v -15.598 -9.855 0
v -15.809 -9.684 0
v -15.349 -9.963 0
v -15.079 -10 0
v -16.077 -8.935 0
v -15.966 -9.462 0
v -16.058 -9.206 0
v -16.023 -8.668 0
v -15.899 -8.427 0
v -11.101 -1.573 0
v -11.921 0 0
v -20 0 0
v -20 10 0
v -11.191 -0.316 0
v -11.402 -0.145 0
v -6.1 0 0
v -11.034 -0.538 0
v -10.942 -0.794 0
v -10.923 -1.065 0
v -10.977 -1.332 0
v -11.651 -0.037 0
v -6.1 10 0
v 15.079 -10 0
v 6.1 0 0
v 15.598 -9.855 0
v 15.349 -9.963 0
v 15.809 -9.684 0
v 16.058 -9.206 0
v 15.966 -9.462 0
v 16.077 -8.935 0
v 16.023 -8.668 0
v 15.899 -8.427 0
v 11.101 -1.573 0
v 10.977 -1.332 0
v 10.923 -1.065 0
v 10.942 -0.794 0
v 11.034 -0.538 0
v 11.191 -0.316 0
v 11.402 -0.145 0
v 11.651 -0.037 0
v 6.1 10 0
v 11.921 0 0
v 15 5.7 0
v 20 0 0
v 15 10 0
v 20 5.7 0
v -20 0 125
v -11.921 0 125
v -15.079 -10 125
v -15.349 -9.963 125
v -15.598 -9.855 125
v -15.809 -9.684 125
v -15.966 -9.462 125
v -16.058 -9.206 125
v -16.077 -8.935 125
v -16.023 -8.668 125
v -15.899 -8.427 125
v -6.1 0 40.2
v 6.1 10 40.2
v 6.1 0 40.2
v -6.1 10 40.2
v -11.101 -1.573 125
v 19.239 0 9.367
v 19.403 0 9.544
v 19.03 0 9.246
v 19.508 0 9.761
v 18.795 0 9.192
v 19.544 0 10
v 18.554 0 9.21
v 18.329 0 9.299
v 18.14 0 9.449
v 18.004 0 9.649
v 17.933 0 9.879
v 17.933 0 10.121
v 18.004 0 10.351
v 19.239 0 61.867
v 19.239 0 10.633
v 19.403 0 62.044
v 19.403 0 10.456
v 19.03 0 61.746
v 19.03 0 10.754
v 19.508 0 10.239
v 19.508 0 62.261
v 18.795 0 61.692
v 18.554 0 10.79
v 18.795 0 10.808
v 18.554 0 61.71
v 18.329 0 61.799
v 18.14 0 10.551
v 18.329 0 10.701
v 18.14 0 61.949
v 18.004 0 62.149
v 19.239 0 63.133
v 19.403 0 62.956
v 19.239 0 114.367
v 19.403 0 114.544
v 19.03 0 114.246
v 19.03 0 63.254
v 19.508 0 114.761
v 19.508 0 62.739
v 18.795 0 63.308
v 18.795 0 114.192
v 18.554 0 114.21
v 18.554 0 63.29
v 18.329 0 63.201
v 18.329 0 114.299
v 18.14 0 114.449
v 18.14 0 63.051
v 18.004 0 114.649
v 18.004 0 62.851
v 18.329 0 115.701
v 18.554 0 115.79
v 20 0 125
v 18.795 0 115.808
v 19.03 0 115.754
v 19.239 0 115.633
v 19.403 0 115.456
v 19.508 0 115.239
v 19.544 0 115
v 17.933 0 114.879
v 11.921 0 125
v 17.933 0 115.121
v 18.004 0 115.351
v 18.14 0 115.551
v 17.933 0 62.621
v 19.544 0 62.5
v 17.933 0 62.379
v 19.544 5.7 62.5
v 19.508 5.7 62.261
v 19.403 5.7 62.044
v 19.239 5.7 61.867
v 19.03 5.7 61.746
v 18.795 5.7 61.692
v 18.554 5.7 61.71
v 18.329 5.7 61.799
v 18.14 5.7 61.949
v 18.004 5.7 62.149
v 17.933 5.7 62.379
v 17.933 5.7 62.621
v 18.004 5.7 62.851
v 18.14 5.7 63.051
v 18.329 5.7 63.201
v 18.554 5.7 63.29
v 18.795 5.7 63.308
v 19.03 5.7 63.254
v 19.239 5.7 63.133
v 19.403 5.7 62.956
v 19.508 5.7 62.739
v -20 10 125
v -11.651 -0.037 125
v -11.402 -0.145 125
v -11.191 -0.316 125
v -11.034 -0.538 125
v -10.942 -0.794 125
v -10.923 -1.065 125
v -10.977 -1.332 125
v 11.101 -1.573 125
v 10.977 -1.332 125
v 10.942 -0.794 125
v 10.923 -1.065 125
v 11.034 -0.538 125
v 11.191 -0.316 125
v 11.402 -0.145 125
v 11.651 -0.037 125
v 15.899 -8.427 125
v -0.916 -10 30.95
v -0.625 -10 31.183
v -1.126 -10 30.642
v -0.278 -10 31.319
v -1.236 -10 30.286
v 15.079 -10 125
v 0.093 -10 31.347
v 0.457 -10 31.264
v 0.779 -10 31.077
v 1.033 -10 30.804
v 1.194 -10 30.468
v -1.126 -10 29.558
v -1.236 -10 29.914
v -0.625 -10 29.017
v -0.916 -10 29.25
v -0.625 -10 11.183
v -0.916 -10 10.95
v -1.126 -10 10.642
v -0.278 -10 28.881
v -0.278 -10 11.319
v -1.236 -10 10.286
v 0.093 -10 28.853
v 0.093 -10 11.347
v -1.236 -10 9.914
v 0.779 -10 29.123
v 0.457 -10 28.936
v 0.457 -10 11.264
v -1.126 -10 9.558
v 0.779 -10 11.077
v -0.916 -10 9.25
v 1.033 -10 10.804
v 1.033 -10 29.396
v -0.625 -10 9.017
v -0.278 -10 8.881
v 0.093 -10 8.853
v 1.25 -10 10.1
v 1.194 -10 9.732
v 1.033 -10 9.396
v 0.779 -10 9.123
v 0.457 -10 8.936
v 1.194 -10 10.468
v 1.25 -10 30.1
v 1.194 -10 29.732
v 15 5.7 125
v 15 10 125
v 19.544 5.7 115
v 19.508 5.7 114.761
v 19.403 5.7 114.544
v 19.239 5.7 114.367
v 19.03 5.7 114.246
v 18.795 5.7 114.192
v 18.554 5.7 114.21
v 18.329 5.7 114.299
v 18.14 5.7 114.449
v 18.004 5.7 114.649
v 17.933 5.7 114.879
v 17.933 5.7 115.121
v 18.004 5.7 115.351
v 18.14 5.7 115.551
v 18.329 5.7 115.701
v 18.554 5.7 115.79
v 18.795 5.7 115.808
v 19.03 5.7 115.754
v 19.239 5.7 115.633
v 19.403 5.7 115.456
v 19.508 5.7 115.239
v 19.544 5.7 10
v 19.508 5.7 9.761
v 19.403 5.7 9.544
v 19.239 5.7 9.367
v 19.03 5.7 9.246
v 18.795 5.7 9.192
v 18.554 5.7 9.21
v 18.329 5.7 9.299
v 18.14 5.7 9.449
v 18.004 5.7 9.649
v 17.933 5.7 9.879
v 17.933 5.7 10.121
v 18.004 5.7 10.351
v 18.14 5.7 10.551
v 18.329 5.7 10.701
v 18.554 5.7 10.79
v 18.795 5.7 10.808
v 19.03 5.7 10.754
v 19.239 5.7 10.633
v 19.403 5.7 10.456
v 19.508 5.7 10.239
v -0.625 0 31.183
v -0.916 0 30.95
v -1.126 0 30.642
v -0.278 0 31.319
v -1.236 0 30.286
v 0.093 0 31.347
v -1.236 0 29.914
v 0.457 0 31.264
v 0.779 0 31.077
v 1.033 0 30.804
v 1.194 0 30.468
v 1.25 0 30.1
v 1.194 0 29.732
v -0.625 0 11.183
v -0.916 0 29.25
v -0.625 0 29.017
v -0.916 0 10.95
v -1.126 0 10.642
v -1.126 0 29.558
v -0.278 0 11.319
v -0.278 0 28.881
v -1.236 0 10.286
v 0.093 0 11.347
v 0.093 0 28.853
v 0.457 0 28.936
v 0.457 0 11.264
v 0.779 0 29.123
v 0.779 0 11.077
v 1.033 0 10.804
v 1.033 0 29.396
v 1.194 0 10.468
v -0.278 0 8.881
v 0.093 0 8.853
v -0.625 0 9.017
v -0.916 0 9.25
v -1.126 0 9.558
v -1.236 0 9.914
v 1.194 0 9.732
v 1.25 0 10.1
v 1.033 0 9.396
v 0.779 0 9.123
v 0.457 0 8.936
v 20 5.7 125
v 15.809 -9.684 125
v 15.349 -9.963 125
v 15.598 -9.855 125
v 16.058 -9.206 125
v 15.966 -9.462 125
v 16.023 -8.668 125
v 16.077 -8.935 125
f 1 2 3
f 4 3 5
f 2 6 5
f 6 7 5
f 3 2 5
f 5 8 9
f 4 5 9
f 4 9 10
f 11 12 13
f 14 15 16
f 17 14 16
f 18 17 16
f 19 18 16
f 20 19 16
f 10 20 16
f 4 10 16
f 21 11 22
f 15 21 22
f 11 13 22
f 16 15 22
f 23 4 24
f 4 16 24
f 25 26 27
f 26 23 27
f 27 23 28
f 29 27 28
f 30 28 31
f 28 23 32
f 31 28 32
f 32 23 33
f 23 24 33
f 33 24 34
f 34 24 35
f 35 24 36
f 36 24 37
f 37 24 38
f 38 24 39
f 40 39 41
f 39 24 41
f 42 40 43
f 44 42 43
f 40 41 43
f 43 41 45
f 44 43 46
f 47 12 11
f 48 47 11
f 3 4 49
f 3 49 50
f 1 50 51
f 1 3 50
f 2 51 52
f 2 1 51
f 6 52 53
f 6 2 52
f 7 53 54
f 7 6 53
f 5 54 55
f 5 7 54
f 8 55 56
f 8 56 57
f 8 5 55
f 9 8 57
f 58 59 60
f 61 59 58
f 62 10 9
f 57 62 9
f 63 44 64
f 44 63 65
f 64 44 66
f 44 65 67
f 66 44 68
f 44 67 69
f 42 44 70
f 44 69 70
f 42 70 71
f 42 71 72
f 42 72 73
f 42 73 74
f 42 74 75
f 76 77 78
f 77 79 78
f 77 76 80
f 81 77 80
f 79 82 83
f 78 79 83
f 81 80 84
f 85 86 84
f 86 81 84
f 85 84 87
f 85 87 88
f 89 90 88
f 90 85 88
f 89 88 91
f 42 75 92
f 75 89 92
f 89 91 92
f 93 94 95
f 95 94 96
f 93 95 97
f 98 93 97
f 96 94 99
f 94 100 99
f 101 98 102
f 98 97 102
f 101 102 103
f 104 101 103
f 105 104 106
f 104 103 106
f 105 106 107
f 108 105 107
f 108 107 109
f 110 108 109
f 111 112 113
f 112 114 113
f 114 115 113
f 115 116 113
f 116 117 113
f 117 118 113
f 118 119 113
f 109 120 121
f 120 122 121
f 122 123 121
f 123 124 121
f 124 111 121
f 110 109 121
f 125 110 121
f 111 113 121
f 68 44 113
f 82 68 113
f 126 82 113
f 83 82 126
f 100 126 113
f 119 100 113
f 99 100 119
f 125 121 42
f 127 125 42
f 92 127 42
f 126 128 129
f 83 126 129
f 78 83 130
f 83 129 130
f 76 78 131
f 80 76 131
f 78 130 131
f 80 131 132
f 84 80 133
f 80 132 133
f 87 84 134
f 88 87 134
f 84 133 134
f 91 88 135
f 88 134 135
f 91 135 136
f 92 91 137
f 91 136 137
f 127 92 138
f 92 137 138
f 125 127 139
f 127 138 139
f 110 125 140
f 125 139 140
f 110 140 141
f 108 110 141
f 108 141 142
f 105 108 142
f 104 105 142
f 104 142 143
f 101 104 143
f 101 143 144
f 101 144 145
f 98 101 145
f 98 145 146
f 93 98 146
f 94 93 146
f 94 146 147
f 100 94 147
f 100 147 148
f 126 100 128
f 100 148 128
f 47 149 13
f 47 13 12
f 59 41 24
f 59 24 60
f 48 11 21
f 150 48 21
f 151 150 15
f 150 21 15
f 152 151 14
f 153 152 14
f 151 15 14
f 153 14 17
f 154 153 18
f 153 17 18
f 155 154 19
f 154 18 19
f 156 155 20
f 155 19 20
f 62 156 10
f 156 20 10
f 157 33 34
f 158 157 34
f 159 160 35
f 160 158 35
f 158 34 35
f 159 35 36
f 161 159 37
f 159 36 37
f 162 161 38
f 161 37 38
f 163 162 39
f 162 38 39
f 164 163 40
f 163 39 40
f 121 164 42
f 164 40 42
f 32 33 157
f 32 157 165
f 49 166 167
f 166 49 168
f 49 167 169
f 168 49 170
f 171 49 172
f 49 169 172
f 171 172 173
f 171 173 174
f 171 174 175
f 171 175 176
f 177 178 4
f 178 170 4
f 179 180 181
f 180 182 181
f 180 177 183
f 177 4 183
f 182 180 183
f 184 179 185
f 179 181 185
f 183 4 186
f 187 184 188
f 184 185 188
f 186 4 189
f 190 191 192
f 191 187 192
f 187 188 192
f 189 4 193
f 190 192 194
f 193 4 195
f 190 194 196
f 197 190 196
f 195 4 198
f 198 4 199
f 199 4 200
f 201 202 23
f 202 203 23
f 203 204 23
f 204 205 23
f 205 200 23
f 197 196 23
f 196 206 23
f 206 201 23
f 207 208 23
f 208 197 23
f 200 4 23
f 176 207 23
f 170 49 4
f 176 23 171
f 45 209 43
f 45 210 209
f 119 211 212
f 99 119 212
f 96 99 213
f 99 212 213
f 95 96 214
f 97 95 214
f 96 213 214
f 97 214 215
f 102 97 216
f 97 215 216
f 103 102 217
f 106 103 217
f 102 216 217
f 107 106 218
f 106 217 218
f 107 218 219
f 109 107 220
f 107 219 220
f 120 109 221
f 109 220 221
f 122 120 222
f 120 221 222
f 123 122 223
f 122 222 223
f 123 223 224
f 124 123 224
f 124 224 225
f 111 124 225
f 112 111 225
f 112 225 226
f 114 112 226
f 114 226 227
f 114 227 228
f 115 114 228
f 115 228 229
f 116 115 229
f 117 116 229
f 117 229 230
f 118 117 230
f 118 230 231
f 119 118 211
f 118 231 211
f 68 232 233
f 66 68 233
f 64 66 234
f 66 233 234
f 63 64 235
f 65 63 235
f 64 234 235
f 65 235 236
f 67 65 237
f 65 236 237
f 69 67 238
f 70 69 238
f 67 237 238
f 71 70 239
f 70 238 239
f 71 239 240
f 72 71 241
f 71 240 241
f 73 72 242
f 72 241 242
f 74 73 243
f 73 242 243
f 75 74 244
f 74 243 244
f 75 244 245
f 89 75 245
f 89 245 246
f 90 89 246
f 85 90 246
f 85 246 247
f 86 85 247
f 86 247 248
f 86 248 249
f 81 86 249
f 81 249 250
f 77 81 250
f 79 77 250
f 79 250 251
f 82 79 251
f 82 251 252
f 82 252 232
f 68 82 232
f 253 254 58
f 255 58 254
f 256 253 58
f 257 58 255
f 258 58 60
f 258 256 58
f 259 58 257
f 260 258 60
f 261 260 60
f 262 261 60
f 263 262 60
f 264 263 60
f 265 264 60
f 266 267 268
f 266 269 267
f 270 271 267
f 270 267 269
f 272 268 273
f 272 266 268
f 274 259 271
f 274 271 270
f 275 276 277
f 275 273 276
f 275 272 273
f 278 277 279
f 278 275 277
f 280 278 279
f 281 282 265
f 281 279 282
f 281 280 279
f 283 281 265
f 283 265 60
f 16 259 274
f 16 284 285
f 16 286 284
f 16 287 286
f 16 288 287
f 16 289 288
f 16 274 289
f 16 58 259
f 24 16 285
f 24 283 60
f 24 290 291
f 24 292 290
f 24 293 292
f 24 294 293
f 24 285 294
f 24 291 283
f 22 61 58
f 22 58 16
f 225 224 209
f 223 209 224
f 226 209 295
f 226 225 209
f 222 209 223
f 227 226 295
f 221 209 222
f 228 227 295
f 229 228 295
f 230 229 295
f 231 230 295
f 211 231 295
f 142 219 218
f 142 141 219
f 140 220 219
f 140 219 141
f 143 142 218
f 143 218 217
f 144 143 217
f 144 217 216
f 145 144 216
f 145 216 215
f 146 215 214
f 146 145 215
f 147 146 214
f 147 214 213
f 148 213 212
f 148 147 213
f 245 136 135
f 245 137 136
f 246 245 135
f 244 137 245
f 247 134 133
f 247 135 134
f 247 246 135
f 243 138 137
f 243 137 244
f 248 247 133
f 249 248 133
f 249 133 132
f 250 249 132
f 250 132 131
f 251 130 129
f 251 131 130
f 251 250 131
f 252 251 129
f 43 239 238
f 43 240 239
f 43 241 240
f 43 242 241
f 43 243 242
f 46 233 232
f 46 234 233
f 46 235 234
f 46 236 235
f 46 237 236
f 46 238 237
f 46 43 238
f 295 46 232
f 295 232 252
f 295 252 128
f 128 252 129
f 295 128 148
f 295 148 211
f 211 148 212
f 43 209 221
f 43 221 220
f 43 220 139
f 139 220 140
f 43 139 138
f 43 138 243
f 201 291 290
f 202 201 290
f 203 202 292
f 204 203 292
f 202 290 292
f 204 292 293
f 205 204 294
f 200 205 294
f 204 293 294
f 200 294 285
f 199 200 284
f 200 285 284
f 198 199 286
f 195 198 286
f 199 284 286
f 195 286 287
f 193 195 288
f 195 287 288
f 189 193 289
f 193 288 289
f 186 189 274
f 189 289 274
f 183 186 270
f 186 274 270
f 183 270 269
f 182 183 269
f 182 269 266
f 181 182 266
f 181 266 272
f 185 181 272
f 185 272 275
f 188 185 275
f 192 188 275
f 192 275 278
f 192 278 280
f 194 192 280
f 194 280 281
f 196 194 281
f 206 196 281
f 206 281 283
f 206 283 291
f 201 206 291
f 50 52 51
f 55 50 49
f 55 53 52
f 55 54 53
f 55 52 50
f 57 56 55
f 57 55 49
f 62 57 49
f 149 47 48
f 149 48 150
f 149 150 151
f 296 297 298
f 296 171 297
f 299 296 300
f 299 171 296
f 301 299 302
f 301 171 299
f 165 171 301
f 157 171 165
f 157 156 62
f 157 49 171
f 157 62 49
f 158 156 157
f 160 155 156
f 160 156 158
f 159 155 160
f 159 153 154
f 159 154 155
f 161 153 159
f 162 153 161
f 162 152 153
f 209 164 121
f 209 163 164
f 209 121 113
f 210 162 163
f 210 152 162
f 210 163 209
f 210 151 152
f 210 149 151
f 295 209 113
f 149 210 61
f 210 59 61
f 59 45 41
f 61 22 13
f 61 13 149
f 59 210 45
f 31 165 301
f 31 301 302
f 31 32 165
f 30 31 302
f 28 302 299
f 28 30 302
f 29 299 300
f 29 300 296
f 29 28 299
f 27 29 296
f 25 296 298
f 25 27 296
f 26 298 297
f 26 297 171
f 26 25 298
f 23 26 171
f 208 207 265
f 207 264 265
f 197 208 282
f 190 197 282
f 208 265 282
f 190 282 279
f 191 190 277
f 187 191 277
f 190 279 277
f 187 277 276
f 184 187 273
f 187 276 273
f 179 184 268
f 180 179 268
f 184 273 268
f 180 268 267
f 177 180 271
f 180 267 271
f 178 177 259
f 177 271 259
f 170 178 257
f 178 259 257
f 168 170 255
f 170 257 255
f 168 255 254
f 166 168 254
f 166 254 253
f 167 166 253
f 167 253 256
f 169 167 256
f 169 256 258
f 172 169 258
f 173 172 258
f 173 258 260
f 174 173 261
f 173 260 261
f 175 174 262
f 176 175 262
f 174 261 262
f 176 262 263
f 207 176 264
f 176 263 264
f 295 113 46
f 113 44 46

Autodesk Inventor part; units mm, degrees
ref_plane "YZ Plane" through (0, 0, 0) normal (1, 0, 0) x (0, 1, 0)
ref_plane "XZ Plane" through (0, 0, 0) normal (0, 1, 0) x (-1, 0, 0)
ref_plane "XY Plane" through (0, 0, 0) normal (0, 0, 1) x (1, 0, 0)
sketch "Sketch1" plane through (0, 0, 0) normal (0, 0, 1) x (1, 0, 0)
  line L0 (-20, -10) -> (20, -10)
  line L1 (20, -10) -> (20, 10)
  line L2 (20, 10) -> (-20, 10)
  line L3 (-20, 10) -> (-20, -10)
  point P0 (0, 0)
  dimension "d0" = 40
  dimension "d1" = 20
  dimension "d2" = 10
  dimension "d3" = 20
extrude "Extrusion1" add sketch "Sketch1" along normal blind 125
sketch "Sketch2" plane through (-20, 10, 0) normal (0, 1, 0) x (1, 0, 0)
  line L0 (40, 0) -> (0, 0) projected
  line L1 (13.9, 0) -> (26.1, 0)
  line L2 (26.1, 0) -> (26.1, -40.2)
  line L3 (26.1, -40.2) -> (13.9, -40.2)
  line L4 (13.9, -40.2) -> (13.9, 0)
  point P0 (20, 0)
  point P1 (26.1, 0)
  dimension "d6" = 40.2
  dimension "d7" = 12.2
  dimension "d8" = 13.9
extrude "Extrusion2" cut sketch "Sketch2" against normal blind 10
sketch "Sketch3" plane through (-20, 10, 125) normal (0, 1, 0) x (1, 0, 0)
  line L0 (40, 125) -> (40, 0) projected
  line L1 (40, 125) -> (26.1, 125) projected
  line L2 (40, 0) -> (35, 0)
  line L3 (35, 0) -> (35, 125)
  line L4 (35, 125) -> (40, 125)
  line L5 (40, 125) -> (40, 0)
  point P0 (20, 125)
  dimension "d11" = 5
extrude "Extrusion3" cut sketch "Sketch3" against normal blind 4.3
sketch "Sketch4" plane through (-20, 0, 0) normal (0, 1, 0) x (1, 0, 0)
  circle A0 centre (20, -10.1) radius 1.25
  line L0 (13.9, 0) -> (26.1, 0) projected
  line L1 (13.9, -40.2) -> (13.9, 0) projected
  circle A1 centre (20, -30.1) radius 1.25
  point P0 (20, 0)
  dimension "d14" = 2.5
  dimension "d15" = 10.1
  dimension "d16" = 6.1
  dimension "d35" = 20
  dimension "d36" = 6.1
extrude "Extrusion4" cut sketch "Sketch4" against normal through all
sketch "Sketch5" plane through (0, 0, 125) normal (0, 0, 1) x (1, 0, 0)
  line L0 (-20, 10) -> (-20, -10) projected
  line L1 (20, -10) -> (20, 5.7) projected
  line L2 (-20, 0) -> (-10, 0)
  line L3 (-10, 0) -> (-20, -10)
  line L4 (-20, 0) -> (-20, -10)
  line L5 (20, 0) -> (20, -10)
  line L6 (20, 0) -> (10, 0)
  line L7 (10, 0) -> (20, -10)
  line L8 (-20, -10) -> (-17, -10)
  line L9 (-20, -10) -> (20, -10) projected
  line L10 (-10, 0) -> (-17, -10)
  line L11 (10, 0) -> (17, -10)
  line L12 (17, -10) -> (20, -10)
  point P0 (0, 0)
  dimension "d19" = 10
  dimension "d21" = 10
  dimension "d24" = 3
  dimension "d25" = 3
extrude "Extrusion5" cut sketch "Sketch5" against normal through all
fillet "Fillet1" radius 1 4 edges at (17, -10, 62.5) (10, 0, 62.5) (-17, -10, 62.5) (-10, 0, 62.5)
sketch "Sketch6" plane through (-20, 5.7, 125) normal (0, 1, 0) x (1, 0, 0)
  circle A0 centre (38.734, 10) radius 0.81
  circle A1 centre (38.734, 115) radius 0.81
  line L0 (40, 0) -> (35, 0) projected
  line L1 (35, 125) -> (40, 125) projected
  line L2 (35, 0) -> (35, 125) projected
  circle A2 centre (38.734, 62.5) radius 0.81
  point P0 (20, 125)
  dimension "d27" = 1.62
  dimension "d28" = 1.62
  dimension "d29" = 10
  dimension "d30" = 10
  dimension "d31" = 3.734
  dimension "d32" = 3.734
  dimension "d37" = 3.734
  dimension "d38" = 1.62
  dimension "d39" = 52.5
  dimension "d40" = 52.5
extrude "Extrusion6" cut sketch "Sketch6" against normal up to surface (5.7 mm away)
equation "\"d2\" = 0.5 * d1"
equation "\"d3\" = 0.5 * d0"
equation "\"d32\" = d31"
equation "\"d37\" = d31"
equation "\"d38\" = d27"
properties part number "3102_Dovetail Slider_V1" material "Acetal Resin, White"
